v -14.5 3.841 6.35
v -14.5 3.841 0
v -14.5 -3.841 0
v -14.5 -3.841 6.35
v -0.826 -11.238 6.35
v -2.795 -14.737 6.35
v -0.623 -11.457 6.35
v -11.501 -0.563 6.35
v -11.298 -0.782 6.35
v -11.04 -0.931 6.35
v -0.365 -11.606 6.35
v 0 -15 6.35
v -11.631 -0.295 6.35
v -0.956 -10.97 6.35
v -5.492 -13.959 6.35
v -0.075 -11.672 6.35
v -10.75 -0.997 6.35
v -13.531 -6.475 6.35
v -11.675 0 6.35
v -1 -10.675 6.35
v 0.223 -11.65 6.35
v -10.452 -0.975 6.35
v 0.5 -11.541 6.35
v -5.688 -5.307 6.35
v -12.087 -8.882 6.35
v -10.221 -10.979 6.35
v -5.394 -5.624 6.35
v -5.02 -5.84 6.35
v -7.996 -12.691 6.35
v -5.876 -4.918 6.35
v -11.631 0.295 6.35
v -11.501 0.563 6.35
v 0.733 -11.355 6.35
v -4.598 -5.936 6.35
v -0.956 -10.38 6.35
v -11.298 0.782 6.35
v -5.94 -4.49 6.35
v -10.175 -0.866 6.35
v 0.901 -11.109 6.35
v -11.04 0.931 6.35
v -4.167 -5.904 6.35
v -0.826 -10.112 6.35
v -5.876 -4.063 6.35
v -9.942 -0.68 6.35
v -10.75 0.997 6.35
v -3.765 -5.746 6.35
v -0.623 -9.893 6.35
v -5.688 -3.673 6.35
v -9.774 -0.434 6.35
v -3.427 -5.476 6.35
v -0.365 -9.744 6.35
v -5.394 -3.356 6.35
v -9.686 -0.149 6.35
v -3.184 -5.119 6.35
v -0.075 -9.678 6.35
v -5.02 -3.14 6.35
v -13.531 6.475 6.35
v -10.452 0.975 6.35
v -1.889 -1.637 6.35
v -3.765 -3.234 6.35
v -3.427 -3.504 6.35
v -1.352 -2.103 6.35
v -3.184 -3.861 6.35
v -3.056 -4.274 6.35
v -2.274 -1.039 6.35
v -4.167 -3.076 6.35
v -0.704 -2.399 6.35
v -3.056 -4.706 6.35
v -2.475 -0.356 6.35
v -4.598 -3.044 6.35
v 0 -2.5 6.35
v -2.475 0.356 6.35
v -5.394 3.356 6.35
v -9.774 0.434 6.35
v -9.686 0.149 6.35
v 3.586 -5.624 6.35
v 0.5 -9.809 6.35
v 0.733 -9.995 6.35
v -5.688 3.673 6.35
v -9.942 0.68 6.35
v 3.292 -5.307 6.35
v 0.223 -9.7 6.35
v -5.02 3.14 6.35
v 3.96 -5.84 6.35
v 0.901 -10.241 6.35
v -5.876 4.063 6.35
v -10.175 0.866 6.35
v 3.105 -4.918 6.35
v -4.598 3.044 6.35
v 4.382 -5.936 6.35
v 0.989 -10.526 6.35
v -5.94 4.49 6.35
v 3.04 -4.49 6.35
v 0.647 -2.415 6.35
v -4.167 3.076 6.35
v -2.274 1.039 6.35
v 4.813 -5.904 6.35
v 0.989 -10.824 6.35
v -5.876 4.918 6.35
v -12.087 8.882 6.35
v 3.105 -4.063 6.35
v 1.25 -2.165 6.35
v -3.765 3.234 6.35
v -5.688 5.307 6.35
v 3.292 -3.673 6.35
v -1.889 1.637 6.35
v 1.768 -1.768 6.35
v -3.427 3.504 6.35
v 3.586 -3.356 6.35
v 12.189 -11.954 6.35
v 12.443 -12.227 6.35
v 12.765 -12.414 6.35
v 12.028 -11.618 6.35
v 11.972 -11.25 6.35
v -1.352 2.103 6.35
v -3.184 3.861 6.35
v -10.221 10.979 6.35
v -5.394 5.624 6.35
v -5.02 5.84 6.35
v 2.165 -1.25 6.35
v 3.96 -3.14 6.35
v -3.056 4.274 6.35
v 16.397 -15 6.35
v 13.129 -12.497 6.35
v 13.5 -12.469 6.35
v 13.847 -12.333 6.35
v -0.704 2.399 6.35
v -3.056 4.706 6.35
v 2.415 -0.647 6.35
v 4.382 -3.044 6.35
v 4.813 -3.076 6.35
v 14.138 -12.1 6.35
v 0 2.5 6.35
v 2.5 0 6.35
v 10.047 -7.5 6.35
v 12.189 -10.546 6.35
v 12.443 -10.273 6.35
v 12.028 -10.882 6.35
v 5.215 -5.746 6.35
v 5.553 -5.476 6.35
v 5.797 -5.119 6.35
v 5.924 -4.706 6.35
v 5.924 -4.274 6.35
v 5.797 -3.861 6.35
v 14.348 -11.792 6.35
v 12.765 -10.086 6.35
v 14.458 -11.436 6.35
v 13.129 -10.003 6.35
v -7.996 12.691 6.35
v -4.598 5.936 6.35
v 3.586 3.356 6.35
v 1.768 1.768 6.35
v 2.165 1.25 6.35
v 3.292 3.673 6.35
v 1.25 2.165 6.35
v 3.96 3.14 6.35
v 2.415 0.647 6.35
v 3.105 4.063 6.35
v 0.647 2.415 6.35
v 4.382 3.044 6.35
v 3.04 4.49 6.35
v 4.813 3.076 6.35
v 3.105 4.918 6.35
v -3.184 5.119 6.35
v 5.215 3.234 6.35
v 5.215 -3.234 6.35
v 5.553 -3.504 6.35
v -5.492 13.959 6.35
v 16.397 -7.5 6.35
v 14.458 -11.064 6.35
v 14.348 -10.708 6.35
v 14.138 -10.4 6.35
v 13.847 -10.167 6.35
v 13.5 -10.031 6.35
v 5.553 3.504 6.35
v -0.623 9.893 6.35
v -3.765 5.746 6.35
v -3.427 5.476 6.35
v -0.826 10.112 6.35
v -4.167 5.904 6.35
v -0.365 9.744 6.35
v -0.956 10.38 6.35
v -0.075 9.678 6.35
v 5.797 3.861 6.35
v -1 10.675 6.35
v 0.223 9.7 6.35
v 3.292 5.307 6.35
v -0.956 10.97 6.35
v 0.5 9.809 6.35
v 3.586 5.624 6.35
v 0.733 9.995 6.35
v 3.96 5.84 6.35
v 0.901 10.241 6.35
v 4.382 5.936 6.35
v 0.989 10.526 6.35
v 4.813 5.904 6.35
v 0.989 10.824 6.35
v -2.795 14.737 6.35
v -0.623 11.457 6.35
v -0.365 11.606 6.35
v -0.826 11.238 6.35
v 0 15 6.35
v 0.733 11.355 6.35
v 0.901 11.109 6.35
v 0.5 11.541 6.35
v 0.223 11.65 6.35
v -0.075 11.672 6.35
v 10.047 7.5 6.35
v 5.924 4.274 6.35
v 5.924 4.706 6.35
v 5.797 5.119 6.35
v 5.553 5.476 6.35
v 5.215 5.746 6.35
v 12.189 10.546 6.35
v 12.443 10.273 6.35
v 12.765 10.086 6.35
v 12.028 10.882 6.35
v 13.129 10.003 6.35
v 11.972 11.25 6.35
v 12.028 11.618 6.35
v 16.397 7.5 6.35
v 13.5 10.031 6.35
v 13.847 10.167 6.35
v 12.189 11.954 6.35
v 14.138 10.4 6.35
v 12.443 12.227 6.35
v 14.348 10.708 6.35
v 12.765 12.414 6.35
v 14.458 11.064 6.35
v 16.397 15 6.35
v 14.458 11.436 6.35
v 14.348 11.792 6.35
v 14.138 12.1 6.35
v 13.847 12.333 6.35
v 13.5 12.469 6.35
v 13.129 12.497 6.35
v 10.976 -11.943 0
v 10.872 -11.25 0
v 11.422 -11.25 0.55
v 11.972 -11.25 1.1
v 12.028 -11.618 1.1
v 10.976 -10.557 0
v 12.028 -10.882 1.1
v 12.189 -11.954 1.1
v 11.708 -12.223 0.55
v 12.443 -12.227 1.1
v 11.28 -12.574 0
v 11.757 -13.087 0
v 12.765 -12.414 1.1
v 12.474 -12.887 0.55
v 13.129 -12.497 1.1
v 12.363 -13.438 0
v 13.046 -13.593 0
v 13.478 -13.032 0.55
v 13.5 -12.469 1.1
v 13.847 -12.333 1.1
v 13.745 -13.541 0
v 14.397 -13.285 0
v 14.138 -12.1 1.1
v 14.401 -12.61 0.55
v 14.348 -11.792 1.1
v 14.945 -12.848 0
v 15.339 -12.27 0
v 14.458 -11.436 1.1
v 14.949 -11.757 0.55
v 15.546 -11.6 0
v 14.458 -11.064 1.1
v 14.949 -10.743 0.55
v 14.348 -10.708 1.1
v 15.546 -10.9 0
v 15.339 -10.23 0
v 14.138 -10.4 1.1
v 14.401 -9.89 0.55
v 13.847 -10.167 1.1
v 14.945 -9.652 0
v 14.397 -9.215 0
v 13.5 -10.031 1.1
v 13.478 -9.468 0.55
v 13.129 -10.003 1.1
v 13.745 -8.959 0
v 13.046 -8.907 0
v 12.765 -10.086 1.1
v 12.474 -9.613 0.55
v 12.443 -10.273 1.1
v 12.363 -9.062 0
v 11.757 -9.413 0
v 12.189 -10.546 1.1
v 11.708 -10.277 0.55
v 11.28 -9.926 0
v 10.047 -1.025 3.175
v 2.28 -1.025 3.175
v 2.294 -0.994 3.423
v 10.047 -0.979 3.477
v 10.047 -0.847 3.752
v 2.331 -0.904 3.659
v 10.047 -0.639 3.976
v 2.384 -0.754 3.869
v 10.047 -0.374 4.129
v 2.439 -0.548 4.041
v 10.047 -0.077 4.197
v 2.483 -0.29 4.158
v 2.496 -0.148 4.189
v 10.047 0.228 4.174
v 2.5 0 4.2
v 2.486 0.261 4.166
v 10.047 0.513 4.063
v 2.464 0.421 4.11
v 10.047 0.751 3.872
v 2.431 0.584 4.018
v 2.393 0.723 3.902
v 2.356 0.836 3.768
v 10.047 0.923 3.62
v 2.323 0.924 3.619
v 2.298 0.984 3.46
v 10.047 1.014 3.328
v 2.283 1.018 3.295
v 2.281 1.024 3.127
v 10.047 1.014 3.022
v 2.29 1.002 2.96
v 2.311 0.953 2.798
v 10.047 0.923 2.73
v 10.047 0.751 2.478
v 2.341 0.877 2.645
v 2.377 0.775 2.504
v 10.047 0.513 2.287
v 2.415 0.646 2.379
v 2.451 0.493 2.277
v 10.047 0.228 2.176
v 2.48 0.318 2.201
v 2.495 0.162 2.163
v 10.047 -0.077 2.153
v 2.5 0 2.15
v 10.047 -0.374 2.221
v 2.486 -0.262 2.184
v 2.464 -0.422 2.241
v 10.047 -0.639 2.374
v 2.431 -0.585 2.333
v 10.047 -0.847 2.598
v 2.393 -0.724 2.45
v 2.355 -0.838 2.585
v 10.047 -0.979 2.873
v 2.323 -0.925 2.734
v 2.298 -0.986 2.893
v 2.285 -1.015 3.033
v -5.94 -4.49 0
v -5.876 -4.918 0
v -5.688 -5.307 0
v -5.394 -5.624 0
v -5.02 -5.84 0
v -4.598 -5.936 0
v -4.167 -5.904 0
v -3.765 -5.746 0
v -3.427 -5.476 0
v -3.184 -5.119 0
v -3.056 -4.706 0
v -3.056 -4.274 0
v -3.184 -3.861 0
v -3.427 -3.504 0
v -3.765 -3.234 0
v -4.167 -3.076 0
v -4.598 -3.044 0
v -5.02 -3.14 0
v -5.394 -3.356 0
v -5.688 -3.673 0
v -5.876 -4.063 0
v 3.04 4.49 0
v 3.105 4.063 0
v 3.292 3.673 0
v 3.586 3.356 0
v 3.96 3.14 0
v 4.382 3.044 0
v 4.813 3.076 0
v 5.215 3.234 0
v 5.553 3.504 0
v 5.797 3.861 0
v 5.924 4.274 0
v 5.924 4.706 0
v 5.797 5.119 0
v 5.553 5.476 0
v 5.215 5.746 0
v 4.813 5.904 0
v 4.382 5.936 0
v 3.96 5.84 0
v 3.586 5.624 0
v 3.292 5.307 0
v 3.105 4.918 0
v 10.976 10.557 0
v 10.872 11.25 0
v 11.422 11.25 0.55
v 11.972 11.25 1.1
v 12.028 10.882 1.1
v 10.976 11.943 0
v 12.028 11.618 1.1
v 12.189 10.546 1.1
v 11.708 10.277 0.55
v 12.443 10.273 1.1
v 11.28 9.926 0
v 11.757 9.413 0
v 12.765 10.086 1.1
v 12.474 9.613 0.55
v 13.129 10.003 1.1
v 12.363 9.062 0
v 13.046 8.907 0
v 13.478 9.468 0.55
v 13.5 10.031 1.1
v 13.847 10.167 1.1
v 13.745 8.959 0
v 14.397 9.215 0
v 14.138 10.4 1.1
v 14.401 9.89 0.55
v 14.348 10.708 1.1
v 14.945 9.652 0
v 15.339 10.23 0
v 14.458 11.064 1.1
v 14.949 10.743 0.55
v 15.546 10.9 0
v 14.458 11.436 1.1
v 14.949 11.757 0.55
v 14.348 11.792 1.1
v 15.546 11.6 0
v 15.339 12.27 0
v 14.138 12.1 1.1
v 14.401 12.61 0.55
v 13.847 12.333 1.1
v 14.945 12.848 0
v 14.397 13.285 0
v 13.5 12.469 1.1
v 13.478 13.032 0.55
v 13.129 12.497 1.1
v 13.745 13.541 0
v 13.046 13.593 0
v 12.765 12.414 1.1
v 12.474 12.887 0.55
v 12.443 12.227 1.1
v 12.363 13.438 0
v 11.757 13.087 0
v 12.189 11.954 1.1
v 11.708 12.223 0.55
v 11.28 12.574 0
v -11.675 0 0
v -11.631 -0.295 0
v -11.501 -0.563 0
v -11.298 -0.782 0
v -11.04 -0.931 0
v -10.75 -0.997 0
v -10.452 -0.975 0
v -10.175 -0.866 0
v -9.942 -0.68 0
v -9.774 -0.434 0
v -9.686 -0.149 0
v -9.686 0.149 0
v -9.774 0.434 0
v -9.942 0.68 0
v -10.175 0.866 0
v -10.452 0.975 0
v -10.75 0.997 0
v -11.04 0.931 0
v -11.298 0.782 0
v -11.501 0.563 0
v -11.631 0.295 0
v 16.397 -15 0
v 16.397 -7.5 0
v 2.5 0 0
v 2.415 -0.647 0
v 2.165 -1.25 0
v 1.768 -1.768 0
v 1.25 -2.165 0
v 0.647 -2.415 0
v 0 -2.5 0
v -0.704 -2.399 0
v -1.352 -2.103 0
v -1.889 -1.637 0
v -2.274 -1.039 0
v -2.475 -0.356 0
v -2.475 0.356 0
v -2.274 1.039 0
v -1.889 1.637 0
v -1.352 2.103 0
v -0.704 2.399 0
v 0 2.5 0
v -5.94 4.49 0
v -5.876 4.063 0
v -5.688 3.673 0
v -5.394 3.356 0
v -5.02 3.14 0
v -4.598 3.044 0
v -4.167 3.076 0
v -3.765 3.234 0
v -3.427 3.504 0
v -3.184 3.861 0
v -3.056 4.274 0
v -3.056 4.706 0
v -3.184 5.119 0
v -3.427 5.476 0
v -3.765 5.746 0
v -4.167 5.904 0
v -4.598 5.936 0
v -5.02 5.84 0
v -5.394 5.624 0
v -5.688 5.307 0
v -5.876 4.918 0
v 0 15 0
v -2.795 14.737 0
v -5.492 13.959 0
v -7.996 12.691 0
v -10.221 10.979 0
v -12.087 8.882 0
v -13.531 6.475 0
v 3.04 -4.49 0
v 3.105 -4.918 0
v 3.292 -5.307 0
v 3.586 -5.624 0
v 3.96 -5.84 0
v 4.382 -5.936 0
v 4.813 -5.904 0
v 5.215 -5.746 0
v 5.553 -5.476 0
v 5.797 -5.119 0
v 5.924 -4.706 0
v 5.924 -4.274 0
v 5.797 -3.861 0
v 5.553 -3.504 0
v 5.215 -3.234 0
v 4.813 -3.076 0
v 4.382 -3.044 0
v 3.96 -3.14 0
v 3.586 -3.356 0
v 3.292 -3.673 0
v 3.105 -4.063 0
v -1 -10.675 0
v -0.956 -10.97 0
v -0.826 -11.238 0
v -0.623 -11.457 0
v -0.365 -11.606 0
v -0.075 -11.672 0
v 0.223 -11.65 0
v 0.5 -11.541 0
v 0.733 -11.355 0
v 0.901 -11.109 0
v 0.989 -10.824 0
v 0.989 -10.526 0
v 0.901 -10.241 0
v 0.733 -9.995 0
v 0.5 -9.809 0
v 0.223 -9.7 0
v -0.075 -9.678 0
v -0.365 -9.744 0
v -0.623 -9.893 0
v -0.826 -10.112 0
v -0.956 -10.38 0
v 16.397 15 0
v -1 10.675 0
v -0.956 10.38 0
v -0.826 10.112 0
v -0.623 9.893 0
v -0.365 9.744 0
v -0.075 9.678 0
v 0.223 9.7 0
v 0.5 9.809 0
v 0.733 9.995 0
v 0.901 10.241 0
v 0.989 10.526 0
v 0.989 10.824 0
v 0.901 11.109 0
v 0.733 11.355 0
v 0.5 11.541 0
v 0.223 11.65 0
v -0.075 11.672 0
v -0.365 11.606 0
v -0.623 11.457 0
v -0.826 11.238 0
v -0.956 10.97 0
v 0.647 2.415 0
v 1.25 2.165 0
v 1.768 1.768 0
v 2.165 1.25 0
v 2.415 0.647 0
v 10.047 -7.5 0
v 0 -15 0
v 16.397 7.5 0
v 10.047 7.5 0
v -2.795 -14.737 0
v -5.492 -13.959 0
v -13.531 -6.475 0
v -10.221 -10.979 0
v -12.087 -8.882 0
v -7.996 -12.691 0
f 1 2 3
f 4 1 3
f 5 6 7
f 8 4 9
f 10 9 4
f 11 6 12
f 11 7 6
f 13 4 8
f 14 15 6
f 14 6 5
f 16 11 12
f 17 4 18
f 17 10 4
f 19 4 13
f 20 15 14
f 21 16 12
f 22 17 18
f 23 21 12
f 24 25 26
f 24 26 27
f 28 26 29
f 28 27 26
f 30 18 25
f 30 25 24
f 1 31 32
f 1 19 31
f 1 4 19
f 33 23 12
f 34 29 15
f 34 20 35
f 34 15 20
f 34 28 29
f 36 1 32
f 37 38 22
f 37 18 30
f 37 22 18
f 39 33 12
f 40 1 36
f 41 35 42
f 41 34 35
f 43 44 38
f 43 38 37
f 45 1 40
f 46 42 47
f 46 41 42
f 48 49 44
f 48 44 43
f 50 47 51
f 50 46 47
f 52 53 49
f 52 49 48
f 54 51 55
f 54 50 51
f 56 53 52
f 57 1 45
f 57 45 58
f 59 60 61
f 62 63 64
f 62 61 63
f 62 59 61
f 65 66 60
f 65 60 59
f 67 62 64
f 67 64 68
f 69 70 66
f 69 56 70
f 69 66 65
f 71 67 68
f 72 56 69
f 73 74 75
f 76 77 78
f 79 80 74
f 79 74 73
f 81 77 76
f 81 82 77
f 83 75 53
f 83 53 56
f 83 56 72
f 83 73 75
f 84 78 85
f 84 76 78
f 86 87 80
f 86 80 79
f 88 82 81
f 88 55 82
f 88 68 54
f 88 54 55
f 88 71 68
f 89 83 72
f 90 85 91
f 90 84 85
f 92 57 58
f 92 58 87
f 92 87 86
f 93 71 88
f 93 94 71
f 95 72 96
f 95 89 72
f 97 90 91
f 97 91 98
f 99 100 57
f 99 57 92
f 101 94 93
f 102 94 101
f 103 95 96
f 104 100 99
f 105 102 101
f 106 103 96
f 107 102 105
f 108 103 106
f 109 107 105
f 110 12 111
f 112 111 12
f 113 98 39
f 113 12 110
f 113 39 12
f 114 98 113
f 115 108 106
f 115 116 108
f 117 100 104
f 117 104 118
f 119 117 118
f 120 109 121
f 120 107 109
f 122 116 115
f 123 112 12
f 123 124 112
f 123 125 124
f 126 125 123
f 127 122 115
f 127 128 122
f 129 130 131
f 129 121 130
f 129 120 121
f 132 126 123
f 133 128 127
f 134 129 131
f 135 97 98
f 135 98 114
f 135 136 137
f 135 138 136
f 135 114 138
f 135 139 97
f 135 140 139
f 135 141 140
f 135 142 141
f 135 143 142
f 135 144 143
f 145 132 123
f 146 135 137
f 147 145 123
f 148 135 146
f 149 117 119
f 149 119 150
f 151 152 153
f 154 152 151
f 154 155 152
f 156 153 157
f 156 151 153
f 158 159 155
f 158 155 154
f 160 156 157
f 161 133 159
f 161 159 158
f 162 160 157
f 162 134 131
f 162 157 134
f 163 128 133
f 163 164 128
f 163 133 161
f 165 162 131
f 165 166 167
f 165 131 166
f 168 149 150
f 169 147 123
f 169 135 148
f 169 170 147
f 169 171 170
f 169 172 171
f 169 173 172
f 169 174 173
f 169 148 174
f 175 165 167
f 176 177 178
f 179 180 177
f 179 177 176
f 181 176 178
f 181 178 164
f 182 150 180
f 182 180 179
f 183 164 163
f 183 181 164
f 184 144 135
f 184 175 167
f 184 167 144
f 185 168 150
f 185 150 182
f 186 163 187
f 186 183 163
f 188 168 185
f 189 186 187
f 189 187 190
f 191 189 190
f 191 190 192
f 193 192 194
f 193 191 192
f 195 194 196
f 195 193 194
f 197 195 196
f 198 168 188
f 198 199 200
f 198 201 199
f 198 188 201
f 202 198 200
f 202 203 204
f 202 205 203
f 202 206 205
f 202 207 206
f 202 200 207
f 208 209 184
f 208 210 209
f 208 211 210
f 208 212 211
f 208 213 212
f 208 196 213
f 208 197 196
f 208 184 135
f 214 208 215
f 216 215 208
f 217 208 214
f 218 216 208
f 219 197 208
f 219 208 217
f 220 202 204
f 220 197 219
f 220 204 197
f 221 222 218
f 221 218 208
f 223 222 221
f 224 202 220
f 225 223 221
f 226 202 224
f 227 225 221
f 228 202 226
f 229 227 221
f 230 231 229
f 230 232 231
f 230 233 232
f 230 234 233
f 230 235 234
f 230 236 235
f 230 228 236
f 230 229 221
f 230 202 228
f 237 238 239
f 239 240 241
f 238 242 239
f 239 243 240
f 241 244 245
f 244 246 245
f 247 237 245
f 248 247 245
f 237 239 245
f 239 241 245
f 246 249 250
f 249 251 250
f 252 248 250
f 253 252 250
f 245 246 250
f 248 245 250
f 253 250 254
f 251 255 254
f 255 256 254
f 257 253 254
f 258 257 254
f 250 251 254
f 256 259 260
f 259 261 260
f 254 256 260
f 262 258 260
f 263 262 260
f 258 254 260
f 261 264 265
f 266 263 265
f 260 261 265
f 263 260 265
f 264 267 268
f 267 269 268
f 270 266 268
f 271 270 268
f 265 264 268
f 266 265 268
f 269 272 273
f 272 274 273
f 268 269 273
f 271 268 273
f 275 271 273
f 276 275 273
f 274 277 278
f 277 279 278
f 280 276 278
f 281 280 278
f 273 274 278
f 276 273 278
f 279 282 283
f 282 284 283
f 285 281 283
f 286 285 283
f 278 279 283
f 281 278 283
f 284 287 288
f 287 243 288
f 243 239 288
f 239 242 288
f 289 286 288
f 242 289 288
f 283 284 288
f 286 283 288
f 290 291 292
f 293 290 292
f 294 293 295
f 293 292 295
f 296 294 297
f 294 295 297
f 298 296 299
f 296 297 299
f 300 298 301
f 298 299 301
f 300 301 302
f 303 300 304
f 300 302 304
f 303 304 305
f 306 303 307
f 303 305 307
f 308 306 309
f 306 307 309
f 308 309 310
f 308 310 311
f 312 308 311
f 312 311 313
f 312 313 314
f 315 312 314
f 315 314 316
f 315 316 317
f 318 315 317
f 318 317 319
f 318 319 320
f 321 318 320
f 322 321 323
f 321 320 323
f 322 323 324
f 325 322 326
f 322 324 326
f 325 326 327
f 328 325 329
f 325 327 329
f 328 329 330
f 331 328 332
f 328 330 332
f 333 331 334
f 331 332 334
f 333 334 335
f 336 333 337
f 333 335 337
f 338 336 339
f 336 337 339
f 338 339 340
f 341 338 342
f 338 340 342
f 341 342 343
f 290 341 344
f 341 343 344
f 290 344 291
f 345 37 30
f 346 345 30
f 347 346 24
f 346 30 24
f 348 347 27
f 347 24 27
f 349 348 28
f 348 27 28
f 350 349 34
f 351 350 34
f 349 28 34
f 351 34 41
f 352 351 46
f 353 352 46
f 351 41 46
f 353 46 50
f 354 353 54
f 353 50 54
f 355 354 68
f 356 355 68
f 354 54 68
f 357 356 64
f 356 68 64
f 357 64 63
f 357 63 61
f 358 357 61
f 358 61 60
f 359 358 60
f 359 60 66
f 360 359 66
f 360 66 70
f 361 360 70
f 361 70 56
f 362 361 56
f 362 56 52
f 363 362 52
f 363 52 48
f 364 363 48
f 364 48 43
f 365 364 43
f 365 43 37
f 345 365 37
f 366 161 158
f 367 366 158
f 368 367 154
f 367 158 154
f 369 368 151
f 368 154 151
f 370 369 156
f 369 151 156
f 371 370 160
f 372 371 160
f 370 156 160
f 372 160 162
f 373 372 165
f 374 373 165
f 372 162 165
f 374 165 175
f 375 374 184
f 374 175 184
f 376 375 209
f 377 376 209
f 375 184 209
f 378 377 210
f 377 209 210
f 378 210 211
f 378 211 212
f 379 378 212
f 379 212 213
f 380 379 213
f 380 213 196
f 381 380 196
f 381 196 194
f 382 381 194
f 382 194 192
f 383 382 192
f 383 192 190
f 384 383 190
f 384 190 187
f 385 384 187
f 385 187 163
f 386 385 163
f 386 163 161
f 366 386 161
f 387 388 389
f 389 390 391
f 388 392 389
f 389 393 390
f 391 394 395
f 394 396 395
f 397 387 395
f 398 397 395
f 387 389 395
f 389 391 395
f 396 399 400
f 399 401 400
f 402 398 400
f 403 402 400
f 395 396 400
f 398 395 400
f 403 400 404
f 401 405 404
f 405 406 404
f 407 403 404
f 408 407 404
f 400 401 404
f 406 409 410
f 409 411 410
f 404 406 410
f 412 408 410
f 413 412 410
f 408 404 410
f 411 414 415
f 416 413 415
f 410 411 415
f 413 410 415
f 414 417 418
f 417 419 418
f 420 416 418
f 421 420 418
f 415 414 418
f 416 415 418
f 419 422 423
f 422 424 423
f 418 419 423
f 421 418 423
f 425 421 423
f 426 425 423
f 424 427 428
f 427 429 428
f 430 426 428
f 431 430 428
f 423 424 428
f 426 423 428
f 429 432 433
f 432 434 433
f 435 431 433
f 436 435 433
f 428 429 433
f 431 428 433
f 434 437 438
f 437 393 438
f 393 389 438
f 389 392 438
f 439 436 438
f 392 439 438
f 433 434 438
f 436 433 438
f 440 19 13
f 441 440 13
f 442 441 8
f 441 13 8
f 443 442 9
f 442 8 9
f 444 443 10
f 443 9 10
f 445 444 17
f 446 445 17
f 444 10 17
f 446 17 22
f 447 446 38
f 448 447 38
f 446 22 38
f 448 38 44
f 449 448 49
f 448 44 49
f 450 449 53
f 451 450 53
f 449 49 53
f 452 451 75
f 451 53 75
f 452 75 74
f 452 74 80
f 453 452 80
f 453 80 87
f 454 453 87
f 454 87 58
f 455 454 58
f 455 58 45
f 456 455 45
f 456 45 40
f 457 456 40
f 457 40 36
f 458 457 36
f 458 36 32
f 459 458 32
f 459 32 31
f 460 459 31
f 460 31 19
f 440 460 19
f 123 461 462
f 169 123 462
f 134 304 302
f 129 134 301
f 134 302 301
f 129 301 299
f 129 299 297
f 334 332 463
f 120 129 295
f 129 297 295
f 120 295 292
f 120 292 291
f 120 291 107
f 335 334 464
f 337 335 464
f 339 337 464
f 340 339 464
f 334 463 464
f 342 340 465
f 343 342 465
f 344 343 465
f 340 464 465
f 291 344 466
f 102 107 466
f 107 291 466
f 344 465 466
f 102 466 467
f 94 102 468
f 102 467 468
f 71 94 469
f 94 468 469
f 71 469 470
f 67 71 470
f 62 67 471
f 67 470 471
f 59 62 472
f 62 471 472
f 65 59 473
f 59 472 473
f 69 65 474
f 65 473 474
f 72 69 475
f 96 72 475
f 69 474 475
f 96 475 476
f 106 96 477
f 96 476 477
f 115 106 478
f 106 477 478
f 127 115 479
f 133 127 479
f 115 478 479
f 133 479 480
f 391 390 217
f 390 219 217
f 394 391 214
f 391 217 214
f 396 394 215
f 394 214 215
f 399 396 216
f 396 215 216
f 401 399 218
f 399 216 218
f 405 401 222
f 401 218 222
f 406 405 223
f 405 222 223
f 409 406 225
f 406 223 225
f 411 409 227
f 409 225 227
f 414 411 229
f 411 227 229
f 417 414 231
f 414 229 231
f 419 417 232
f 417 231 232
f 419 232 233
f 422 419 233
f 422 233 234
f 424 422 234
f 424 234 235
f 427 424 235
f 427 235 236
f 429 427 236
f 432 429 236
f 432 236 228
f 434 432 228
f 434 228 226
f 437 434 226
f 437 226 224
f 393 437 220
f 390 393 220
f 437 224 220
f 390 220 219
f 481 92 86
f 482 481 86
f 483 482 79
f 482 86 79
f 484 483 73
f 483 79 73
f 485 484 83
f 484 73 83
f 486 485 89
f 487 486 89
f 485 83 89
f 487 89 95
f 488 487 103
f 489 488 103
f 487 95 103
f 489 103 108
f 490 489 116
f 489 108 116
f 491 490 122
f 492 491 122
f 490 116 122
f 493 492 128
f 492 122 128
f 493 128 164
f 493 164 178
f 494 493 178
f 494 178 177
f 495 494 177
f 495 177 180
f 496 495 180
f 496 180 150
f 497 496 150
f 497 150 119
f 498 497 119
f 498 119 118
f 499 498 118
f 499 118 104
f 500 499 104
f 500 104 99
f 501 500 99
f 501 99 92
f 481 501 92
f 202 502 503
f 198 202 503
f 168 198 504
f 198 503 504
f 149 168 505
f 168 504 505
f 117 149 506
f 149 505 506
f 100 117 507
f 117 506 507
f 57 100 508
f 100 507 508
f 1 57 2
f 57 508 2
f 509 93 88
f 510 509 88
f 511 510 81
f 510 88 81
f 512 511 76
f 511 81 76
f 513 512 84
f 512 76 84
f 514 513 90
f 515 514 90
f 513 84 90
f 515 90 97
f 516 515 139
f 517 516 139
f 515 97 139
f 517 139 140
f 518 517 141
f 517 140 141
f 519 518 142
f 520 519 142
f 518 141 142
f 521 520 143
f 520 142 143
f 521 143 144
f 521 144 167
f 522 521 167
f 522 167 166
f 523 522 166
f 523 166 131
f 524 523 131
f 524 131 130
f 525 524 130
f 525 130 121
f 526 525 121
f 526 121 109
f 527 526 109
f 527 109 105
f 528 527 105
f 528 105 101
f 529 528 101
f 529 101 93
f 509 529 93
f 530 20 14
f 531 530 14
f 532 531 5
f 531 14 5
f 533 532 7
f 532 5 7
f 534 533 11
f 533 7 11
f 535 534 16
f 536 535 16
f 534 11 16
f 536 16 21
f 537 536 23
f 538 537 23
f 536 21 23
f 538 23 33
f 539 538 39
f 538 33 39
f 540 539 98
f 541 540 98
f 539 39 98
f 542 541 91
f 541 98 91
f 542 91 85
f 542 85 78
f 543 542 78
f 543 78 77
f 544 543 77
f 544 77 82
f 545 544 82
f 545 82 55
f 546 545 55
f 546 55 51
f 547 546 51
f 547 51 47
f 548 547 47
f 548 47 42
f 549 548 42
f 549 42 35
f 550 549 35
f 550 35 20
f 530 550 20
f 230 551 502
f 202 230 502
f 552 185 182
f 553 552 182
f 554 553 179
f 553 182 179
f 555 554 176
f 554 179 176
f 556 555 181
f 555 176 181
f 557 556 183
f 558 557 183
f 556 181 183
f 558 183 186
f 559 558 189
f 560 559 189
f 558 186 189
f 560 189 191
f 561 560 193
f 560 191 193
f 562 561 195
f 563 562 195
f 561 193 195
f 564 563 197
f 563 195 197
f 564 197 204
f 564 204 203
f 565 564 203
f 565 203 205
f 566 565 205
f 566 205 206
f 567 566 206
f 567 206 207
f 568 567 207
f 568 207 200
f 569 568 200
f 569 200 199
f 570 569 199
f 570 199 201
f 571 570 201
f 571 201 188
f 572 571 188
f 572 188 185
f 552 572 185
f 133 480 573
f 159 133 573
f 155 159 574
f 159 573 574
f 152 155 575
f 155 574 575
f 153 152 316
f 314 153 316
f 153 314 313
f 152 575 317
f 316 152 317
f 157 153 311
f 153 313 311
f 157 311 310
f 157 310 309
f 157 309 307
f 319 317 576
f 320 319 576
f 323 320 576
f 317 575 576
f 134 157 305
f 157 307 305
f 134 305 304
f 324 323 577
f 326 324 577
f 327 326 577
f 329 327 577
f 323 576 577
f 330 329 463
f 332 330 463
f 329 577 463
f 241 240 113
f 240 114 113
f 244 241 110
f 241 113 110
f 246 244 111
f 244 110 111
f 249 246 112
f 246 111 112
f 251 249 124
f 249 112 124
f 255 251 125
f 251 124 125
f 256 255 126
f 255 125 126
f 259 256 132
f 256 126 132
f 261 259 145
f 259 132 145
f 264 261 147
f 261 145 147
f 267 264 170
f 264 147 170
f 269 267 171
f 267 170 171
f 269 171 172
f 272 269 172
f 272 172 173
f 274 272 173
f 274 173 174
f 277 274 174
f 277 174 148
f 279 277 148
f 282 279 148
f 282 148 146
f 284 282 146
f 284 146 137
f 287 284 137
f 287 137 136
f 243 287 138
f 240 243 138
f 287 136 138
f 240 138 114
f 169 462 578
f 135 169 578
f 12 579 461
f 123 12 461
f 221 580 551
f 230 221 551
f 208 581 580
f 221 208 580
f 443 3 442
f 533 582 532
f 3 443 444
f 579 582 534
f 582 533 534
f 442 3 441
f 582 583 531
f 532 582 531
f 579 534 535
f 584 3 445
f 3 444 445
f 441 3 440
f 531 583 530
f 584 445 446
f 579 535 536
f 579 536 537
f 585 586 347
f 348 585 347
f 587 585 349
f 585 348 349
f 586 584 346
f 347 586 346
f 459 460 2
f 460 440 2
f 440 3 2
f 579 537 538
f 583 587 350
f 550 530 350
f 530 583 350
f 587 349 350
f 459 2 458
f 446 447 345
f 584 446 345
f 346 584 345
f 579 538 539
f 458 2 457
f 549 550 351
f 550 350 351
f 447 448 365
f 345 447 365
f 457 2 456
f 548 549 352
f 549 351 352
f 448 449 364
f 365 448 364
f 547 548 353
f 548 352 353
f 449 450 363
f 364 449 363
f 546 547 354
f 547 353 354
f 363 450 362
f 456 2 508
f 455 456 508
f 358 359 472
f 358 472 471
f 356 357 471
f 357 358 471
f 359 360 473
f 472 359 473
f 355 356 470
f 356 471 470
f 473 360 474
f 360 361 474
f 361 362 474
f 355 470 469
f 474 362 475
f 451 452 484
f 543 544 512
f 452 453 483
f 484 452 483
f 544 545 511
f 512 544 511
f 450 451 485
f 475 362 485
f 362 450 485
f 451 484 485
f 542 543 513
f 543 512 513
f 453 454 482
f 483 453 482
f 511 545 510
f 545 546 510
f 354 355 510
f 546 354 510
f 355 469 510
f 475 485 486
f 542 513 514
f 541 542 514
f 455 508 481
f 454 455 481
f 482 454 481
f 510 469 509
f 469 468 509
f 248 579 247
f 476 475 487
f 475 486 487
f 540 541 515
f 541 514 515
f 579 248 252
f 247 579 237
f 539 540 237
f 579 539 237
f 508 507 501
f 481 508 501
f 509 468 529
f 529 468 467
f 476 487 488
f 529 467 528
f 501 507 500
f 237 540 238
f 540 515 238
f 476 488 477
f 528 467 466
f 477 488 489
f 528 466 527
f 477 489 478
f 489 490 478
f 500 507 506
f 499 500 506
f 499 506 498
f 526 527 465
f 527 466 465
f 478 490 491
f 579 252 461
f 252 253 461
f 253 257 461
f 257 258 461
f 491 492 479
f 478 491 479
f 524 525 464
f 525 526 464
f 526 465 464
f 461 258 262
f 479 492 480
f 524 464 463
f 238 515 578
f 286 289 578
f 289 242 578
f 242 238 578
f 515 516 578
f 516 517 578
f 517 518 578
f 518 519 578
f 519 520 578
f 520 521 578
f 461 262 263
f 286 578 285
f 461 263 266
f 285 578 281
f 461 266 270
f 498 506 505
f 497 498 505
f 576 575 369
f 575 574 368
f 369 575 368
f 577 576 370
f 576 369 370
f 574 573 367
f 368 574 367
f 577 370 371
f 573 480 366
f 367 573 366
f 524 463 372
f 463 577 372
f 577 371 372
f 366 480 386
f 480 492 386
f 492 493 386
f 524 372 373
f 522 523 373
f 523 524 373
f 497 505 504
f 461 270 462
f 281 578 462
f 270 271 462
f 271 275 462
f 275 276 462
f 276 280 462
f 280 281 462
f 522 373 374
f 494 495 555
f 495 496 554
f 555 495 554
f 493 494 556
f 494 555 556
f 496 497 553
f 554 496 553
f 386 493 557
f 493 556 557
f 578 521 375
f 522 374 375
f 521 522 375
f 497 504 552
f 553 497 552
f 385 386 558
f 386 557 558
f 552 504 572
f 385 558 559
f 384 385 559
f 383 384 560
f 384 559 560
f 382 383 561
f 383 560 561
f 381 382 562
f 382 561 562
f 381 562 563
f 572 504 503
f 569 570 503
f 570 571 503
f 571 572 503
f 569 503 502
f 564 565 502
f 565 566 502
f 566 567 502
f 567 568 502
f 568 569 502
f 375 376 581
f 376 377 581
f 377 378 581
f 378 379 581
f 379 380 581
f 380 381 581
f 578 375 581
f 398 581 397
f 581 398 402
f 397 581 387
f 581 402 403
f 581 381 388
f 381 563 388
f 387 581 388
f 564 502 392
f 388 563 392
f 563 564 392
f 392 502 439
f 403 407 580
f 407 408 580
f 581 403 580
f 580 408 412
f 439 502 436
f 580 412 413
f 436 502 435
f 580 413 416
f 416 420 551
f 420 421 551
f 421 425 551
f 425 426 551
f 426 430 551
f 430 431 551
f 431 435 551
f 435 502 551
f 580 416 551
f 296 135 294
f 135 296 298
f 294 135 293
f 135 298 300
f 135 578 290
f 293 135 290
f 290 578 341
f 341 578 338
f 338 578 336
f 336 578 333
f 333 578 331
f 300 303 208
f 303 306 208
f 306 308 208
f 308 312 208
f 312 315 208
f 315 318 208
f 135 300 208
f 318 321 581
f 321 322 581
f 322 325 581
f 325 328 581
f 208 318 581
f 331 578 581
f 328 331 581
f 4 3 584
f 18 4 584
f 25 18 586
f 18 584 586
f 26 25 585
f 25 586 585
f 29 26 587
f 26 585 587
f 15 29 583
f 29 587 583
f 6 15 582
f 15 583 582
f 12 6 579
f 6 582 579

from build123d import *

# Parameters (mm, degrees)
F1_DEPTH       = 6.35
F2_D           = 2.5
F2_CSINK_D     = 4.7
F2_CSINK_ANGLE = 90
F3_D           = 2.9
F4_D           = 2
F6_D           = 2.05
F6_DEPTH       = 8
F6_TIP         = 0.6158821345


# Not quite as in the source:
# - ends of sketch curves that miss each other by under 0.0002 mm in the source are joined
# - a length typed as a fraction of an inch, garbled in the dataset ("3 / 203.2 mm" for 3/8 in), is restored


with BuildPart() as f1:
    # F0 (on Top) → F1 (new body)
    with BuildSketch(Plane.XY):
        with BuildLine():
            ThreePointArc((0, -2.5), (-2.5, 0), (0, 2.5))
            Line((0, 2.5), (0, 6.35))
            Line((0, 6.35), (0, 15))
            ThreePointArc((0, 15), (-9.1485355902, 11.8871483777), (-14.5, 3.8405728739))
            Line((-14.5, 3.8405728739), (-14.5, -3.8405728739))
            ThreePointArc((-14.5, -3.8405728739), (-9.1485355902, -11.8871483777), (0, -15))
            Line((0, -15), (0, -2.5))
        make_face()
        with BuildLine():
            ThreePointArc((0, 2.5), (1.767766953, 1.767766953), (2.5, 0))
            ThreePointArc((2.5, 0), (1.767766953, -1.767766953), (0, -2.5))
            Line((0, -2.5), (0, -15))
            Line((0, -15), (16.39699, -15))
            Line((16.39699, -15), (16.39699, -7.5))
            Line((16.39699, -7.5), (10.0469859317, -7.5))
            Line((10.0469859317, -7.5), (10.0469859317, 7.5))
            Line((10.0469859317, 7.5), (16.3969859317, 7.5))
            Line((16.3969859317, 7.5), (16.39699, 15))
            Line((16.39699, 15), (0, 15))
            Line((0, 15), (0, 6.35))
            Line((0, 6.35), (0, 2.5))
        make_face()
    extrude(amount=F1_DEPTH)

    # F2 (through all)
    with Locations(Plane(origin=(0, 0, 0), x_dir=(1, 0, 0), z_dir=(0, 0, -1))):
        with Locations((13.2219879658, -11.25), (13.2219879658, 11.25)):
            CounterSinkHole(F2_D / 2, F2_CSINK_D / 2, counter_sink_angle=F2_CSINK_ANGLE)

    # F3 (through all)
    with Locations(Plane(origin=(0, 0, 0), x_dir=(1, 0, 0), z_dir=(0, 0, -1))):
        with Locations((-4.4901280605, -4.4901280605), (4.4901280605, -4.4901280605), (4.4901280605, 4.4901280605), (-4.4901280605, 4.4901280605)):
            Hole(F3_D / 2)

    # F4 (through all)
    with Locations(Plane(origin=(0, 0, 0), x_dir=(1, 0, 0), z_dir=(0, 0, -1))):
        with Locations((0, -10.675), (-10.675, 0), (0, 10.675)):
            Hole(F4_D / 2)

    # F6
    with Locations(Plane.YZ.offset(10.0469859317)):
        with Locations((0, 3.175)):
            Hole(F6_D / 2, depth=F6_DEPTH)
            with Locations((0, 0, -(F6_DEPTH + F6_TIP / 2))):  # 118° drill point
                Cone(0, F6_D / 2, F6_TIP, mode=Mode.SUBTRACT)


solid = f1.part
